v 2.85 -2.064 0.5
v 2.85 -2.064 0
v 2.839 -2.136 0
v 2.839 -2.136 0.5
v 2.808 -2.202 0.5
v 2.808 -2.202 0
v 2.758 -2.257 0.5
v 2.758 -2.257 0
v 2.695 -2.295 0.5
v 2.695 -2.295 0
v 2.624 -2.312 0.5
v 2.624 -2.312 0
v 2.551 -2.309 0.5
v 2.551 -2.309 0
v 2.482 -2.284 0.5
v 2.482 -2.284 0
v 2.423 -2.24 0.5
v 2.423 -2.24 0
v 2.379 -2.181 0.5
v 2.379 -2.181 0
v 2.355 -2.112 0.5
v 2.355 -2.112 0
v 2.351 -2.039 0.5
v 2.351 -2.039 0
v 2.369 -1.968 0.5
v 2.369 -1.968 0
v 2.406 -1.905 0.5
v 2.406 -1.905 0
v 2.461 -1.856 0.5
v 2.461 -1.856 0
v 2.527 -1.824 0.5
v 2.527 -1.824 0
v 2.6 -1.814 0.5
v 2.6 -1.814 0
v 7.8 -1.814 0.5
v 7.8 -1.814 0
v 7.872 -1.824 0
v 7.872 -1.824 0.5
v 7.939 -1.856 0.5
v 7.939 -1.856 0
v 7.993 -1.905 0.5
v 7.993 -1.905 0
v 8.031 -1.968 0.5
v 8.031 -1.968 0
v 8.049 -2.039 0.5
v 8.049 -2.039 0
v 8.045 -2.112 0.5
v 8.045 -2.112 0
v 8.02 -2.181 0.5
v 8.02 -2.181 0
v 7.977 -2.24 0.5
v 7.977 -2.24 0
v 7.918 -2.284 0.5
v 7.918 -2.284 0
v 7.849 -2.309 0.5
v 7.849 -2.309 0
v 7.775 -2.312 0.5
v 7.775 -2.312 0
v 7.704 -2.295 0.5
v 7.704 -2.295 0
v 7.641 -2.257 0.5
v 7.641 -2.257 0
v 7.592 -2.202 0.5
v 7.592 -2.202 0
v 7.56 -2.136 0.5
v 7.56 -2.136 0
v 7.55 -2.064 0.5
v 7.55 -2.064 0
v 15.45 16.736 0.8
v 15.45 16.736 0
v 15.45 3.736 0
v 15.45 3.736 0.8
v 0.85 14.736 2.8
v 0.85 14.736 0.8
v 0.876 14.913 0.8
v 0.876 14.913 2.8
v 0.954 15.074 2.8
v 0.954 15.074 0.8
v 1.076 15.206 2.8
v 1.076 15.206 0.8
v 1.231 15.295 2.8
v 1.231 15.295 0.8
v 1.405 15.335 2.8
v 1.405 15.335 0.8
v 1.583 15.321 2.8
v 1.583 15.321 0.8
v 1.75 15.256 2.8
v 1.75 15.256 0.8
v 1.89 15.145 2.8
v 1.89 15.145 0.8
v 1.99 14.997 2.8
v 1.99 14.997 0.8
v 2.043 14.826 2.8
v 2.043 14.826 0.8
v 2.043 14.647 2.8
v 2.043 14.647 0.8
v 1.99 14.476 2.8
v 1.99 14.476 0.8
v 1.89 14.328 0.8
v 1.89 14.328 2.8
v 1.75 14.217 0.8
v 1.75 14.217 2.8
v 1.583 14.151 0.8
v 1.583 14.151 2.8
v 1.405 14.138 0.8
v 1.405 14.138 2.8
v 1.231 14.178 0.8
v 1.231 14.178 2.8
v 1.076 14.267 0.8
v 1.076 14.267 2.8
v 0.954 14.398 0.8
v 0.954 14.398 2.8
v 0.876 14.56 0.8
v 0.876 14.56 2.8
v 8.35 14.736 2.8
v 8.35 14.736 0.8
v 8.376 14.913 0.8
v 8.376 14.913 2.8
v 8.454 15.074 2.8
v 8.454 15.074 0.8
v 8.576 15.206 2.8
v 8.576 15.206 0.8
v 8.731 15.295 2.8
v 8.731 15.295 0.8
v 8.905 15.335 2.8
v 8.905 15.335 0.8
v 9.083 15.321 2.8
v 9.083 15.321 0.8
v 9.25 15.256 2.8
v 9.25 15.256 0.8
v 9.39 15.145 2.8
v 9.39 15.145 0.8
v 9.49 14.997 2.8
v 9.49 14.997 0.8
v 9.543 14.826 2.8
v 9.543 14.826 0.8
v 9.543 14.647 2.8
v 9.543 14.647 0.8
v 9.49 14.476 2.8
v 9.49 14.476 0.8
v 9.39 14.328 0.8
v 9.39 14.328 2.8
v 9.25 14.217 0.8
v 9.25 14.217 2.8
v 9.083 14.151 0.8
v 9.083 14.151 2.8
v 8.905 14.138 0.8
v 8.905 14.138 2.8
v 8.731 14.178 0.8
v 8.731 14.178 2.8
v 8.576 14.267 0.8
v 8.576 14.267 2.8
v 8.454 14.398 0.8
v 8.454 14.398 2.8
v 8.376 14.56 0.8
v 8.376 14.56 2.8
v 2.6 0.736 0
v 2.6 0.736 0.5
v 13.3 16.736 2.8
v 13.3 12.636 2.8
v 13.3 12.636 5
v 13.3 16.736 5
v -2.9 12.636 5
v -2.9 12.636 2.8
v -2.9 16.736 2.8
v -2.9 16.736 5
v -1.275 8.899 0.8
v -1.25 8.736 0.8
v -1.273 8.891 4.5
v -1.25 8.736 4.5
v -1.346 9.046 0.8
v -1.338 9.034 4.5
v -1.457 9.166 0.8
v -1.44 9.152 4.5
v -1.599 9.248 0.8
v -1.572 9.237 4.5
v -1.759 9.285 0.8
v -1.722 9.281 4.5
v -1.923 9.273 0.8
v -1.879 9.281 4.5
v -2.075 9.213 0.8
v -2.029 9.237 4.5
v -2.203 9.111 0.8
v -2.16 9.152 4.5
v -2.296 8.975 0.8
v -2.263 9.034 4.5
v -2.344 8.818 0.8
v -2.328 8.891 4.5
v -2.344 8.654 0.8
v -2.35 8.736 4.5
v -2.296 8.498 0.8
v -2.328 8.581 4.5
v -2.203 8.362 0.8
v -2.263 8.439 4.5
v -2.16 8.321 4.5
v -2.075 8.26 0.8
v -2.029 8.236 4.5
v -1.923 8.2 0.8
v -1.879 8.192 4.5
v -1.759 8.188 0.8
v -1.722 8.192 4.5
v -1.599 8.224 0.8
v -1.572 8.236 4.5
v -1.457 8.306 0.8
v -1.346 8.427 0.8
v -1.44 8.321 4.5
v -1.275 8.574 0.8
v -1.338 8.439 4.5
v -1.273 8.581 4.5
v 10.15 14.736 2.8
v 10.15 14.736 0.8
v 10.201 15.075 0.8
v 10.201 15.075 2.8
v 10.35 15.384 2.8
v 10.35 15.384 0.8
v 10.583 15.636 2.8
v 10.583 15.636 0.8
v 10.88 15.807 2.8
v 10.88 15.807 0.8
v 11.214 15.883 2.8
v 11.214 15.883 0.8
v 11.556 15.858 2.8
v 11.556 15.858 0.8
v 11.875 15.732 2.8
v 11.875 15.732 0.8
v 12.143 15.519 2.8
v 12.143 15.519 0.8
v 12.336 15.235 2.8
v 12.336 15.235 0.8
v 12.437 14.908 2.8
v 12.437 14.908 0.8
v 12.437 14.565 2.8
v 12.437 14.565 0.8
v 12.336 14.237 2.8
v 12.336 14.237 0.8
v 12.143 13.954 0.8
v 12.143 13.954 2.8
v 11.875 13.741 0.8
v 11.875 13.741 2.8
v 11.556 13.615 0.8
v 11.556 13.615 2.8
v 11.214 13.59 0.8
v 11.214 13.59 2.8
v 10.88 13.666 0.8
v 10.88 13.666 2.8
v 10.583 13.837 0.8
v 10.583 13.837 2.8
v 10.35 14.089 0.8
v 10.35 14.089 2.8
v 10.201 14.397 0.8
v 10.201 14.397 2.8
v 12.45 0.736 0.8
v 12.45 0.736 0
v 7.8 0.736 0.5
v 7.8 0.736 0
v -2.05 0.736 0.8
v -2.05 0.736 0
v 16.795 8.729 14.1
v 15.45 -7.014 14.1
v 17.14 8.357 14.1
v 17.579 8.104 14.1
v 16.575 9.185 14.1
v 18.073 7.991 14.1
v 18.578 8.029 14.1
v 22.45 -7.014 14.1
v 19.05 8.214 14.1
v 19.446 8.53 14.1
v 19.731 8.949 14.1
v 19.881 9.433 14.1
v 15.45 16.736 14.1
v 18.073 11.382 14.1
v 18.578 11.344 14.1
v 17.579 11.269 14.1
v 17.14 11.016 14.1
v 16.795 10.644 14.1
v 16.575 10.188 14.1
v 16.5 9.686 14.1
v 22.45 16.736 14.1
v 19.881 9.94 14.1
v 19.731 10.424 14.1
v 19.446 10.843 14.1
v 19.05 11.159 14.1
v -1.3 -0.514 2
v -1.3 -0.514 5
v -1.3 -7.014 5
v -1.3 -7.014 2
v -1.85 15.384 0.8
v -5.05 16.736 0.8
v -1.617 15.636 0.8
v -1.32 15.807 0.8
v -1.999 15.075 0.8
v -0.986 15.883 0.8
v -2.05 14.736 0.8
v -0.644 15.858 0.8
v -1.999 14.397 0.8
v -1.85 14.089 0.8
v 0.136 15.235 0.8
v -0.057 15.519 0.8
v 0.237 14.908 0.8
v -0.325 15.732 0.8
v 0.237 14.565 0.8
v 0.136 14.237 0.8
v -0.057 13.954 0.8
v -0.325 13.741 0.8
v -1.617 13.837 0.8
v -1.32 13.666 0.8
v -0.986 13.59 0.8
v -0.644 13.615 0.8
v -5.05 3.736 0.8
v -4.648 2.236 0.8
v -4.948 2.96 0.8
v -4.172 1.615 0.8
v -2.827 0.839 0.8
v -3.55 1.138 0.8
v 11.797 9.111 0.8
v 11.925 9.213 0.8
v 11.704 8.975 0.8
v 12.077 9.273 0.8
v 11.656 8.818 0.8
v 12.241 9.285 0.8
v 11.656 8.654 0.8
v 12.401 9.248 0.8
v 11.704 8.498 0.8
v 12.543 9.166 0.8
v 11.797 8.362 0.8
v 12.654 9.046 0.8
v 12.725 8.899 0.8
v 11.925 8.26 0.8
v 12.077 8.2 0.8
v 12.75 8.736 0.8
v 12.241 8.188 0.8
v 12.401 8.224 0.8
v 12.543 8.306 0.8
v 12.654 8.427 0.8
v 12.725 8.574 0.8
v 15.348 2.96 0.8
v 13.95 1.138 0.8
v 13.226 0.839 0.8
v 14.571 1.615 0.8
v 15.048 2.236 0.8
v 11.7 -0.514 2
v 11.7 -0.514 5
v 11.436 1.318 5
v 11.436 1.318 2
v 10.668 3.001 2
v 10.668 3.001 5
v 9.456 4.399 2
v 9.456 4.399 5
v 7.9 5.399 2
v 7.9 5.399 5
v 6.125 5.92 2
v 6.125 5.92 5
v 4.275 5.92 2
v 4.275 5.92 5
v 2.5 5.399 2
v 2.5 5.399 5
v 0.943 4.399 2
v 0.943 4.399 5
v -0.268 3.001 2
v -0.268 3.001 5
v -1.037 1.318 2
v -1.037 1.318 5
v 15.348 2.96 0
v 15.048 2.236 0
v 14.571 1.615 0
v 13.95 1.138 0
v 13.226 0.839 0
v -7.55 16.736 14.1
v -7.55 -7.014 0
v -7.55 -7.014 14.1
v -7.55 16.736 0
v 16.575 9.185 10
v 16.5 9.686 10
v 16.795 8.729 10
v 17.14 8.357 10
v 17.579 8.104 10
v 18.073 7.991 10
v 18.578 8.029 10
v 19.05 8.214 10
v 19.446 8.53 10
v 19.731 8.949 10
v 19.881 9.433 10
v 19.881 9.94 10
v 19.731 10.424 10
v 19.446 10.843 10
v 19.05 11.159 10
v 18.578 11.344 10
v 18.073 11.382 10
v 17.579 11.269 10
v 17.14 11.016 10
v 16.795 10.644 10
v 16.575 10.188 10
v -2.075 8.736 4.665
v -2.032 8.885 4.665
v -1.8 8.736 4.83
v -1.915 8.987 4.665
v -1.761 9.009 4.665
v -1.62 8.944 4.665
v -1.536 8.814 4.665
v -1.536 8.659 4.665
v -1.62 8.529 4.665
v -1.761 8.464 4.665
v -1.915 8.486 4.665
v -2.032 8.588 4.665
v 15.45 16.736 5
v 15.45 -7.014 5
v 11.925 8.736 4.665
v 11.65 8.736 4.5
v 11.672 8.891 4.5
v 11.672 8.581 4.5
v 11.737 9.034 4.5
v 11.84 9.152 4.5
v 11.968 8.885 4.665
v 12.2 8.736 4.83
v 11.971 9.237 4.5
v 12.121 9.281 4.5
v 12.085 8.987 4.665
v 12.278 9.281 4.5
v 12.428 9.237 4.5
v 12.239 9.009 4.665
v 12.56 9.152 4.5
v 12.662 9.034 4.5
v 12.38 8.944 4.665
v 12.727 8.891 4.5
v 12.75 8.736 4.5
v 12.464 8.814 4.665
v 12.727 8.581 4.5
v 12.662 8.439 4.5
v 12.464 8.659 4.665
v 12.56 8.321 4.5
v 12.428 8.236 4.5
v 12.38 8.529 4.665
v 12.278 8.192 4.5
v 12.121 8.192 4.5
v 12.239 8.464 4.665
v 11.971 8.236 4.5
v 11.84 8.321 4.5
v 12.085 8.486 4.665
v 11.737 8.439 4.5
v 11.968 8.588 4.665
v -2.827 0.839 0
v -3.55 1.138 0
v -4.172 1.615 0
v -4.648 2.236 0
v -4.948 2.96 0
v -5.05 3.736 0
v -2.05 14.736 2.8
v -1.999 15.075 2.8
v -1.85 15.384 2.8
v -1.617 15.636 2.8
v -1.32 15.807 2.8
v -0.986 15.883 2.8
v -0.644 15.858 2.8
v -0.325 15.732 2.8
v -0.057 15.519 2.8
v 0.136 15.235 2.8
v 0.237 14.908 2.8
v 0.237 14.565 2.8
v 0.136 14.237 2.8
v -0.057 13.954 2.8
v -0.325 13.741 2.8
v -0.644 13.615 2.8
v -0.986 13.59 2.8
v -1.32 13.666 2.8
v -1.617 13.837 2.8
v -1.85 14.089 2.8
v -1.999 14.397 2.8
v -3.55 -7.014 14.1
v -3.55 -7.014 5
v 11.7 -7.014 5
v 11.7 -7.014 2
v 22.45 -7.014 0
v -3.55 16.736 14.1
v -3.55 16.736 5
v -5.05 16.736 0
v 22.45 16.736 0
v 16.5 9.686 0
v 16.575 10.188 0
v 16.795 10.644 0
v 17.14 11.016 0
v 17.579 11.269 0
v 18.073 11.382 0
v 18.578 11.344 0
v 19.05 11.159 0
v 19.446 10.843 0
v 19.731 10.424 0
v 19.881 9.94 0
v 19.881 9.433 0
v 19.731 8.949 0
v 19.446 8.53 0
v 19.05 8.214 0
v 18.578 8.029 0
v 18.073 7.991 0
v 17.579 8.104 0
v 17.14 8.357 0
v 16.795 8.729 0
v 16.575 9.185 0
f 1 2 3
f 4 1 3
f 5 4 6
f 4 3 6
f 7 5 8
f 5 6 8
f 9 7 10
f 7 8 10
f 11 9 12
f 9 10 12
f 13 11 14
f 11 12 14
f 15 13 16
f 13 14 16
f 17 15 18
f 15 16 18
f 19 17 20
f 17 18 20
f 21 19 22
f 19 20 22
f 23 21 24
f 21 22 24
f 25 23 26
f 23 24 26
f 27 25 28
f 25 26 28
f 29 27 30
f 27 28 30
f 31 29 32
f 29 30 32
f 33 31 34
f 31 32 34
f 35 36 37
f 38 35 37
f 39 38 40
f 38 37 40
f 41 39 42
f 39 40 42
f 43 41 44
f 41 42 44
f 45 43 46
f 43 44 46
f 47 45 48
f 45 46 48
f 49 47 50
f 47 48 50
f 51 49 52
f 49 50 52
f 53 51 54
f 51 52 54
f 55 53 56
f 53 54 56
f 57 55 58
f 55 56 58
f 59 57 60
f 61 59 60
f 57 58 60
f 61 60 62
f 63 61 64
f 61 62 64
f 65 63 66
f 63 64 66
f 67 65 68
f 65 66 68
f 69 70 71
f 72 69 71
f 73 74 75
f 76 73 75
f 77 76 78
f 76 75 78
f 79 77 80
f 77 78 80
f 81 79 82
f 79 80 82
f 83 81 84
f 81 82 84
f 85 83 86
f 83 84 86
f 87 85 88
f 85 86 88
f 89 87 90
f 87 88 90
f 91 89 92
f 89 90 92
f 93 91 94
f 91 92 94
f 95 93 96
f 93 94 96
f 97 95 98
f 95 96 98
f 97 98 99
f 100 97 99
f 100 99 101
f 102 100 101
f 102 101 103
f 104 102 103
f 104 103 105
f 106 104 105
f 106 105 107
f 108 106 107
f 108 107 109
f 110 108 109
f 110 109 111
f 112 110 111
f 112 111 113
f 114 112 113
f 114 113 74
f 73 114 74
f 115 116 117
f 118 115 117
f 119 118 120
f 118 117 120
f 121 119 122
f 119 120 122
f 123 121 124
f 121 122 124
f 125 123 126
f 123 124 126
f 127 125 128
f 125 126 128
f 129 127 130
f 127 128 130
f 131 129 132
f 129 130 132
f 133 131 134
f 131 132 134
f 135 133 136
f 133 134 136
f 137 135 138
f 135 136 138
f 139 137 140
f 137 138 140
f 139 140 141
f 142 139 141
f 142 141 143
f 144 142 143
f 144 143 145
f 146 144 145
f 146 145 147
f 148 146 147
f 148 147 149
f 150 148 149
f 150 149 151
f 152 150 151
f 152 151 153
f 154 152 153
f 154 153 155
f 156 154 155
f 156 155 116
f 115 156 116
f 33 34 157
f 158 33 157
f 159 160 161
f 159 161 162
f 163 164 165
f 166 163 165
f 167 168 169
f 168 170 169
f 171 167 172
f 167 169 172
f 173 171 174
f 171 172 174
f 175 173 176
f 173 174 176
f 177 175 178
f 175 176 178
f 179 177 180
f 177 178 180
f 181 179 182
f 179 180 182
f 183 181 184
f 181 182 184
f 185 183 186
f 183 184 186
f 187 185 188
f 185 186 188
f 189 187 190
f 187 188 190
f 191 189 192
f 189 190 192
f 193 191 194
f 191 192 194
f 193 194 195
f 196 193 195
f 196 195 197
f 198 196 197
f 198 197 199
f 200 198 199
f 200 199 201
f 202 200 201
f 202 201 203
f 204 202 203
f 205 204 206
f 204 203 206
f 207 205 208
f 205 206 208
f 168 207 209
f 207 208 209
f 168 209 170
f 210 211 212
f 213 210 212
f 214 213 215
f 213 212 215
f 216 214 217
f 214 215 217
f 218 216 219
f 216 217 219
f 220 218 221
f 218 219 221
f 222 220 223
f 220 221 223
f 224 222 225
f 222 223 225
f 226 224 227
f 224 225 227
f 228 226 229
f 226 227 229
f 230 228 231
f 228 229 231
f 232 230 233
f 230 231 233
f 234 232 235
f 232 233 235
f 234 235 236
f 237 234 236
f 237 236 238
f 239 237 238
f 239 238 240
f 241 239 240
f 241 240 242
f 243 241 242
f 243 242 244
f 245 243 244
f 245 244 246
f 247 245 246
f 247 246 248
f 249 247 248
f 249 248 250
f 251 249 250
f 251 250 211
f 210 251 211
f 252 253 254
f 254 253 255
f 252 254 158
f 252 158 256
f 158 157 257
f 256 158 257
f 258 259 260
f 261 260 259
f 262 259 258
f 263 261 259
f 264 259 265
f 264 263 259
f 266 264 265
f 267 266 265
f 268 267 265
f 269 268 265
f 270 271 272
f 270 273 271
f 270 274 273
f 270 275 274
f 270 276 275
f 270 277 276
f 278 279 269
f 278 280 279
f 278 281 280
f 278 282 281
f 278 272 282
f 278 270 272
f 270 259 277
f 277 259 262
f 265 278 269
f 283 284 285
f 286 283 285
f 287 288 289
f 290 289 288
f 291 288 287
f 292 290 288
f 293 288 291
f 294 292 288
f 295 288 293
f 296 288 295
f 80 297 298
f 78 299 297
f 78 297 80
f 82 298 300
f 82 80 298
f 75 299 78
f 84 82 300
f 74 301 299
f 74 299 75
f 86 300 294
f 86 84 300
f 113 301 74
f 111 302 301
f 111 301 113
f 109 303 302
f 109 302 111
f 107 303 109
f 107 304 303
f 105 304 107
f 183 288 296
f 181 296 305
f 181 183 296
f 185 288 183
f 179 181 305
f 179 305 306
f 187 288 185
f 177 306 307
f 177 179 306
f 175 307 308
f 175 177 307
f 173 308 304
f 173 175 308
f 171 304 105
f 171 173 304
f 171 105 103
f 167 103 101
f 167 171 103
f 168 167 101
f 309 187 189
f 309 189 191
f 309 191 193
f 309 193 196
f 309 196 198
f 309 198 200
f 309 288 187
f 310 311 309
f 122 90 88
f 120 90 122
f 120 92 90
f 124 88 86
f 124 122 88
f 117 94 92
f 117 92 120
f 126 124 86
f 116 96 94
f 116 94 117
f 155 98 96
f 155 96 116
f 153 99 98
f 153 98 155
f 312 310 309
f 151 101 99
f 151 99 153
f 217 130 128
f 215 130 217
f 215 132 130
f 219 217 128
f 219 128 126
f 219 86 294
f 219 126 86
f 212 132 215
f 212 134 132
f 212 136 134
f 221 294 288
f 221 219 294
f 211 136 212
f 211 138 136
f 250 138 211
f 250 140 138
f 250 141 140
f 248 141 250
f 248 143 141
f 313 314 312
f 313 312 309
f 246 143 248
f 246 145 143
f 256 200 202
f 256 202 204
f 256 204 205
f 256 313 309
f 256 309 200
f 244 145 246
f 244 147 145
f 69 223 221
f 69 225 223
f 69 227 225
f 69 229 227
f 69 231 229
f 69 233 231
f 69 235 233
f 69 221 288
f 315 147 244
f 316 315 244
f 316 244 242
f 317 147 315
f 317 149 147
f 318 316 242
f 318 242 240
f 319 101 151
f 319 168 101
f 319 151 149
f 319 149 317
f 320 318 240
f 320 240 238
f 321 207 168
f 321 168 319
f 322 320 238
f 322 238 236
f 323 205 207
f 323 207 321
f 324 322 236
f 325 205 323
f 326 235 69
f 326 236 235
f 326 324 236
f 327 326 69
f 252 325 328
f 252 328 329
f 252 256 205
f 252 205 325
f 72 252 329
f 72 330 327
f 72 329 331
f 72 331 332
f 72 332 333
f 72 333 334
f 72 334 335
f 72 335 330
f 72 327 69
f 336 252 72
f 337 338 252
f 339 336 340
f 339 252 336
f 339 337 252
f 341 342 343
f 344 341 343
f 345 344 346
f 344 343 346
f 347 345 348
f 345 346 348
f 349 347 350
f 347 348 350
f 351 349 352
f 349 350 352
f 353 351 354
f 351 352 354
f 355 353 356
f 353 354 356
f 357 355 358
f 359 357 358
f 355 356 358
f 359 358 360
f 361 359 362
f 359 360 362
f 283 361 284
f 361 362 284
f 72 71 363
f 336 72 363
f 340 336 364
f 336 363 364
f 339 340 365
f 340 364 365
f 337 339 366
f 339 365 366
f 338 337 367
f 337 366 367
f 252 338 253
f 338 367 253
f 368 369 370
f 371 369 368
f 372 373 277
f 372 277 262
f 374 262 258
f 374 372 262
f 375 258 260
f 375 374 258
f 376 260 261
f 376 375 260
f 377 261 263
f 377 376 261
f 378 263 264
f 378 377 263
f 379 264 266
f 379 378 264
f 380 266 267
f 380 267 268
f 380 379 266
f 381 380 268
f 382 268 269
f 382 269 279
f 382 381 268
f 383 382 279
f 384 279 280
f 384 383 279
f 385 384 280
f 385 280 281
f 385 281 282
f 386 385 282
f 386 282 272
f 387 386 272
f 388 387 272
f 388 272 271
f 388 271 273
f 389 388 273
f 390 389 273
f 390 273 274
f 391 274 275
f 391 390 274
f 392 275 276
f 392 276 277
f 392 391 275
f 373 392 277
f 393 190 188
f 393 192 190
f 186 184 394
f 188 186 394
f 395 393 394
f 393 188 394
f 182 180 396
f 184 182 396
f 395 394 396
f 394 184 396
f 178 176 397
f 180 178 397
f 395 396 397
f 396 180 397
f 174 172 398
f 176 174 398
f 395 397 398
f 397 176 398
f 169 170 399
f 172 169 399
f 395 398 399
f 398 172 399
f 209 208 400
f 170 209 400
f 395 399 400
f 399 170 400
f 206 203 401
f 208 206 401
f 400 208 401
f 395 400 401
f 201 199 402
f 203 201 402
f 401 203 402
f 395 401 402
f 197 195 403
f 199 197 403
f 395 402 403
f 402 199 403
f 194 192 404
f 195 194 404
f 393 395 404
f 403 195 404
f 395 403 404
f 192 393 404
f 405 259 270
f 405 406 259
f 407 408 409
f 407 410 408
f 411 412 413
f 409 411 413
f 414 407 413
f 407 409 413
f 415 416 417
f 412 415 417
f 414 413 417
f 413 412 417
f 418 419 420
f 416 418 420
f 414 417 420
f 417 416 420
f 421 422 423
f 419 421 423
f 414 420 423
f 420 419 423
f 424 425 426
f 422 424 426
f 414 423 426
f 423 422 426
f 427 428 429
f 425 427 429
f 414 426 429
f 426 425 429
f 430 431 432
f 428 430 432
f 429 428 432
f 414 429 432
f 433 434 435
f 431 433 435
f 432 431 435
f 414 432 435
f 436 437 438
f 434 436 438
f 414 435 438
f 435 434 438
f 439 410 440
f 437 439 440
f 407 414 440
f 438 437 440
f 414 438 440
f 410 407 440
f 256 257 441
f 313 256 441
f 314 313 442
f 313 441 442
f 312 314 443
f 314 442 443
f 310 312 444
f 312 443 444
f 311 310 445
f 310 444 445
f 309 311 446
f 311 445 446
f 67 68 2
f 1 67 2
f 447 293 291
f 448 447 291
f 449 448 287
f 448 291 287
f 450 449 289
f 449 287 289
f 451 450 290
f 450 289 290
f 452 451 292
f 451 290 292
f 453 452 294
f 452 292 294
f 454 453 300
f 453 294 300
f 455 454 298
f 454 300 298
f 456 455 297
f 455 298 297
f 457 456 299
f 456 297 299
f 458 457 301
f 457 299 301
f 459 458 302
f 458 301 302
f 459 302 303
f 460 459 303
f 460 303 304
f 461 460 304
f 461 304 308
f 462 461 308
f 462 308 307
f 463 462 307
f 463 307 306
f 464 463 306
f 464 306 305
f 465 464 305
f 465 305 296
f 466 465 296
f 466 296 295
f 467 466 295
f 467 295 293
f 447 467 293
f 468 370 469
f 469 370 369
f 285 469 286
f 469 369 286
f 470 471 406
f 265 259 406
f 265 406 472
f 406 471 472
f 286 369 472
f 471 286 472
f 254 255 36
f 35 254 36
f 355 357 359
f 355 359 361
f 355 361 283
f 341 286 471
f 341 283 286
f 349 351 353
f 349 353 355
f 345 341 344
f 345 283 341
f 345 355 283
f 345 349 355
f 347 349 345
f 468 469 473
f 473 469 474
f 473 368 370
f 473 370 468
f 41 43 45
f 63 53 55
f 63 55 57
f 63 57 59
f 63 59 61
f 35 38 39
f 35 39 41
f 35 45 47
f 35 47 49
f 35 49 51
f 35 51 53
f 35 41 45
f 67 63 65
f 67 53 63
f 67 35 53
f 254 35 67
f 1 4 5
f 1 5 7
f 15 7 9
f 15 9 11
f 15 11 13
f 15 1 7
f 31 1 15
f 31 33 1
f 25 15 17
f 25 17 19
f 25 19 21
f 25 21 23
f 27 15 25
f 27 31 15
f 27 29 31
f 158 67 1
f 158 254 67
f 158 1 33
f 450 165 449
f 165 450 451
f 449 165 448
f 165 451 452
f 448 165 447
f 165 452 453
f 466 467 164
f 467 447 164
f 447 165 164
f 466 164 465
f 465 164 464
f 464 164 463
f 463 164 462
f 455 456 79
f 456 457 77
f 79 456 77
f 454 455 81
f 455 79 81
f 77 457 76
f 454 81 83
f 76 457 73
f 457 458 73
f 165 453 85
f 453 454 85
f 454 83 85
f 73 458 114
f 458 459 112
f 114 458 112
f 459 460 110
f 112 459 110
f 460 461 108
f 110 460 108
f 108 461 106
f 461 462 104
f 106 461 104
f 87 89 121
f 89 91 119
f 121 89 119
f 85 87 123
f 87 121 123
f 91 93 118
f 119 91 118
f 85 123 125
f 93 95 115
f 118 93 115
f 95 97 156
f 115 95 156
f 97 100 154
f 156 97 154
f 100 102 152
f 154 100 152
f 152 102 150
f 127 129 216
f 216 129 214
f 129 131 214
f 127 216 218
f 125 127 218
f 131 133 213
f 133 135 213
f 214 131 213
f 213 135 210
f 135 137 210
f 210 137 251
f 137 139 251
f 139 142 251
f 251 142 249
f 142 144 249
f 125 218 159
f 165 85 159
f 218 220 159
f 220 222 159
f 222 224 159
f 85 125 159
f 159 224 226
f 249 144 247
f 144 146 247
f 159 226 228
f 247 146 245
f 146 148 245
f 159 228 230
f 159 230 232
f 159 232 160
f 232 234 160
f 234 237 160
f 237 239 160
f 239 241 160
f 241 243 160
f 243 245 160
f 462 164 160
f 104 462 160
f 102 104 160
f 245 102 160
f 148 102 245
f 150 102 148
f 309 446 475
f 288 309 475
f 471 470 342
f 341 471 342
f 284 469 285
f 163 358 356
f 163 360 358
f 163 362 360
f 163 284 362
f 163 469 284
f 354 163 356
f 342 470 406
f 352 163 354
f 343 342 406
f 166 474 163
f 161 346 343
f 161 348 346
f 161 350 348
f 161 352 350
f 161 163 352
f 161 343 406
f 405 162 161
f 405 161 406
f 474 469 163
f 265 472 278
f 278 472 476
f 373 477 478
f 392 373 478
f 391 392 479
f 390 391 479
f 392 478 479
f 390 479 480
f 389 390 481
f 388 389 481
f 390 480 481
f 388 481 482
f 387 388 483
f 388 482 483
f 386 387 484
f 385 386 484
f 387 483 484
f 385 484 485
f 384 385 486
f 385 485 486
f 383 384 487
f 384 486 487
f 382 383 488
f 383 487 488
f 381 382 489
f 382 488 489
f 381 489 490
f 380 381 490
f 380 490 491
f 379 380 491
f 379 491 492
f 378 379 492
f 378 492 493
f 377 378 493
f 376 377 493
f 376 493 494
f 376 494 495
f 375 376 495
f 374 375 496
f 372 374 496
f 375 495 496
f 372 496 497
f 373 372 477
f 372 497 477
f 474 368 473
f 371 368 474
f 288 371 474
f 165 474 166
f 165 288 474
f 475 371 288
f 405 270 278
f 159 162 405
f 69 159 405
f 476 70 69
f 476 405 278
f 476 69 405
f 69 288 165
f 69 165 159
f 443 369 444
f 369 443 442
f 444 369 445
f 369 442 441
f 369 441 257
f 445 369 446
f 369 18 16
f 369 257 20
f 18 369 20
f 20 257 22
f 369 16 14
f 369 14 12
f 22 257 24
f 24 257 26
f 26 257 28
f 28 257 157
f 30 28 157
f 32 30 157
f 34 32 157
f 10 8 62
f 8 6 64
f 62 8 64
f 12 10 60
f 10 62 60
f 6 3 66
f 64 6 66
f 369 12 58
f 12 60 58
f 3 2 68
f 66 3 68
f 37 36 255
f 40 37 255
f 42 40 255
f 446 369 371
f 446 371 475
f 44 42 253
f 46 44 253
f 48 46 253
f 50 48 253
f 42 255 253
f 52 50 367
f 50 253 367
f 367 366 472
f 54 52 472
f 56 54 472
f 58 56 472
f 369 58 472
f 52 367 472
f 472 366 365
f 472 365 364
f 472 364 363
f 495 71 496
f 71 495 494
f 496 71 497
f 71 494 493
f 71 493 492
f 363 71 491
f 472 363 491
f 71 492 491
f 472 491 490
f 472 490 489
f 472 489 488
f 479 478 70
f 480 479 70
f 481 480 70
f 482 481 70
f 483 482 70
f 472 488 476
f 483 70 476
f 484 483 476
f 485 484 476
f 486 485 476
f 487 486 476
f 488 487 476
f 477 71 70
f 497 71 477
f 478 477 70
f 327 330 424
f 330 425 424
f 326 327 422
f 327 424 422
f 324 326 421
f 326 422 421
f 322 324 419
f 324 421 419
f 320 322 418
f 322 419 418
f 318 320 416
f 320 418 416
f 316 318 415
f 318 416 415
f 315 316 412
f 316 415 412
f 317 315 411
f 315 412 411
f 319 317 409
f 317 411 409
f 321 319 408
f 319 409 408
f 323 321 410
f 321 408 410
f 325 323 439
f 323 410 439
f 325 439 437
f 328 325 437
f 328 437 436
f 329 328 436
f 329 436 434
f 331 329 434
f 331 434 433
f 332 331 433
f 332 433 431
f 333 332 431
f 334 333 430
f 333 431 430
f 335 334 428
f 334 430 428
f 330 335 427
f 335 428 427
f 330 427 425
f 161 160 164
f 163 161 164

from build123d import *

# Parameters (mm, degrees)
SKETCH_1_W           = 30
SKETCH_1_H           = 28
EXTRUDE_1_DEPTH      = 10
CUT_EXTRUDE_2_DEPTH  = 0.8
M1_4X0_3_2_D         = 1.1
M1_4X0_3_2_DEPTH     = 3.7
M1_4X0_3_2_TIP       = 0.33047334
CUT_EXTRUDE_4_DEPTH  = 0.5
SKETCH_12_W          = 30
SKETCH_12_H          = 4.25
CUT_EXTRUDE_5_DEPTH  = 10
SKETCH_13_R          = 1.7
CUT_EXTRUDE_6_DEPTH  = 10
SKETCH_14_W          = 23
SKETCH_14_H          = 23.75
CUT_EXTRUDE_7_DEPTH  = 5
CUT_EXTRUDE_9_DEPTH  = 3
SKETCH_20_W          = 7
SKETCH_20_H          = 23.75
SKETCH_20_R          = 1.7
EXTRUDE_3_DEPTH      = 4.1
SKETCH_23_W          = 4
SKETCH_23_H          = 23.75
EXTRUDE_4_DEPTH      = 9.1
SKETCH_24_W          = 16.2
SKETCH_24_H          = 4.1
CUT_EXTRUDE_10_DEPTH = 5
SKETCH_29_W          = 16.2
SKETCH_29_H          = 2
EXTRUDE_5_DEPTH      = 4.1
SKETCH_30_R          = 1.15
SKETCH_30_R_2        = 0.6
CUT_EXTRUDE_12_DEPTH = 5


with BuildPart() as part:
    # 草图1 → 凸台-拉伸1 (new body)
    with BuildSketch(Plane.XY):
        with Locations((7.449728974, 2.736434109)):
            Rectangle(SKETCH_1_W, SKETCH_1_H)
    extrude(amount=EXTRUDE_1_DEPTH)

    # 草图2 → 切除-拉伸2 (cut)
    with BuildSketch(Plane(origin=(0, 0, 0), x_dir=(-1, 0, 0), z_dir=(0, 0, -1))):
        with BuildLine():
            Line((5.050271026, 16.736434109), (-15.449728974, 16.736434109))
            Line((-15.449728974, 16.736434109), (-15.449728974, 3.736434109))
            ThreePointArc((-15.449728974, 3.736434109), (-14.571049317, 1.615113765), (-12.449728974, 0.736434109))
            Line((-12.449728974, 0.736434109), (2.050271026, 0.736434109))
            ThreePointArc((2.050271026, 0.736434109), (4.17159137, 1.615113765), (5.050271026, 3.736434109))
            Line((5.050271026, 3.736434109), (5.050271026, 16.736434109))
        make_face()
    extrude(amount=-CUT_EXTRUDE_2_DEPTH, mode=Mode.SUBTRACT)

    # M1.4x0.3 螺纹孔2
    with Locations(Plane(origin=(0, 0, 0.8), x_dir=(-1, 0, 0), z_dir=(0, 0, -1))):
        with Locations((-12.199728974, 8.736434109), (1.800271026, 8.736434109)):
            Hole(M1_4X0_3_2_D / 2, depth=M1_4X0_3_2_DEPTH)
            with Locations((0, 0, -(M1_4X0_3_2_DEPTH + M1_4X0_3_2_TIP / 2))):  # 118° drill point
                Cone(0, M1_4X0_3_2_D / 2, M1_4X0_3_2_TIP, mode=Mode.SUBTRACT)

    # 草图11 → 切除-拉伸4 (cut)
    with BuildSketch(Plane(origin=(0, 0, 0), x_dir=(-1, 0, 0), z_dir=(0, 0, -1))):
        with BuildLine():
            Line((-7.549728974, -2.063565891), (-2.849728974, -2.063565891))
            ThreePointArc((-2.849728974, -2.063565891), (-2.422952278, -2.240342587), (-2.599728974, -1.813565891))
            Line((-2.599728974, -1.813565891), (-2.599728974, 0.736434109))
            Line((-2.599728974, 0.736434109), (-7.799728974, 0.736434109))
            Line((-7.799728974, 0.736434109), (-7.799728974, -1.813565891))
            ThreePointArc((-7.799728974, -1.813565891), (-7.976505669, -2.240342587), (-7.549728974, -2.063565891))
        make_face()
    extrude(amount=-CUT_EXTRUDE_4_DEPTH, mode=Mode.SUBTRACT)

    # 草图12 → 切除-拉伸5 (cut)
    with BuildSketch(Plane(origin=(0, 0, 0), x_dir=(-1, 0, 0), z_dir=(0, 0, -1))):
        with Locations((-7.449728974, -9.138565891)):
            Rectangle(SKETCH_12_W, SKETCH_12_H)
    extrude(amount=-CUT_EXTRUDE_5_DEPTH, mode=Mode.SUBTRACT)

    # 草图13 → 切除-拉伸6 (cut)
    with BuildSketch(Plane(origin=(0, 0, 0), x_dir=(-1, 0, 0), z_dir=(0, 0, -1))):
        with Locations((-18.199728974, 9.686434109)):
            Circle(SKETCH_13_R)
    extrude(amount=-CUT_EXTRUDE_6_DEPTH, mode=Mode.SUBTRACT)

    # 草图14 → 切除-拉伸7 (cut)
    with BuildSketch(Plane.XY.offset(10)):
        with Locations((3.949728974, 4.861434109)):
            Rectangle(SKETCH_14_W, SKETCH_14_H)
    extrude(amount=-CUT_EXTRUDE_7_DEPTH, mode=Mode.SUBTRACT)

    # 草图16 → 切除-拉伸9 (cut)
    with BuildSketch(Plane.XY.offset(5)):
        with BuildLine():
            Line((-1.300271026, -7.013565891), (11.699728974, -7.013565891))
            Line((11.699728974, -7.013565891), (11.699728974, -0.513565891))
            ThreePointArc((11.699728974, -0.513565891), (5.199728974, 5.986434109), (-1.300271026, -0.513565891))
            Line((-1.300271026, -0.513565891), (-1.300271026, -7.013565891))
        make_face()
    extrude(amount=-CUT_EXTRUDE_9_DEPTH, mode=Mode.SUBTRACT)

    # 草图20 → 凸台-拉伸3 (add)
    with BuildSketch(Plane.XY.offset(10)):
        with Locations((18.949728974, 4.861434109)):
            Rectangle(SKETCH_20_W, SKETCH_20_H)
        with Locations(Location((18.199728974, 9.686434109, 0), (0, 0, 180))):
            Circle(SKETCH_20_R, mode=Mode.SUBTRACT)
    extrude(amount=EXTRUDE_3_DEPTH)

    # 草图23 → 凸台-拉伸4 (add)
    with BuildSketch(Plane.XY.offset(5)):
        with Locations((-5.550271026, 4.861434109)):
            Rectangle(SKETCH_23_W, SKETCH_23_H)
    extrude(amount=EXTRUDE_4_DEPTH)

    # 草图24 → 切除-拉伸10 (cut)
    with BuildSketch(Plane(origin=(0, 0, 0.8), x_dir=(-1, 0, 0), z_dir=(0, 0, -1))):
        with Locations((-5.199728974, 14.686434109)):
            Rectangle(SKETCH_24_W, SKETCH_24_H)
    extrude(amount=-CUT_EXTRUDE_10_DEPTH, mode=Mode.SUBTRACT)

    # 草图29 → 凸台-拉伸5 (add)
    with BuildSketch(Plane(origin=(0, 12.636434109, 0), x_dir=(1, 0, 0), z_dir=(0, 1, 0))):
        with Locations((5.199728974, -1.8)):
            Rectangle(SKETCH_29_W, SKETCH_29_H)
    extrude(amount=EXTRUDE_5_DEPTH)

    # 草图30 → 切除-拉伸12 (cut)
    with BuildSketch(Plane(origin=(0, 0, 0.8), x_dir=(-1, 0, 0), z_dir=(0, 0, -1))):
        with Locations((0.900271026, 14.736434109)):
            Circle(SKETCH_30_R)
        with Locations((-11.299728974, 14.736434109)):
            Circle(SKETCH_30_R)
        with Locations((-1.449728974, 14.736434109)):
            Circle(SKETCH_30_R_2)
        with Locations((-8.949728974, 14.736434109)):
            Circle(SKETCH_30_R_2)
    extrude(amount=-CUT_EXTRUDE_12_DEPTH, mode=Mode.SUBTRACT)


solid = part.part
